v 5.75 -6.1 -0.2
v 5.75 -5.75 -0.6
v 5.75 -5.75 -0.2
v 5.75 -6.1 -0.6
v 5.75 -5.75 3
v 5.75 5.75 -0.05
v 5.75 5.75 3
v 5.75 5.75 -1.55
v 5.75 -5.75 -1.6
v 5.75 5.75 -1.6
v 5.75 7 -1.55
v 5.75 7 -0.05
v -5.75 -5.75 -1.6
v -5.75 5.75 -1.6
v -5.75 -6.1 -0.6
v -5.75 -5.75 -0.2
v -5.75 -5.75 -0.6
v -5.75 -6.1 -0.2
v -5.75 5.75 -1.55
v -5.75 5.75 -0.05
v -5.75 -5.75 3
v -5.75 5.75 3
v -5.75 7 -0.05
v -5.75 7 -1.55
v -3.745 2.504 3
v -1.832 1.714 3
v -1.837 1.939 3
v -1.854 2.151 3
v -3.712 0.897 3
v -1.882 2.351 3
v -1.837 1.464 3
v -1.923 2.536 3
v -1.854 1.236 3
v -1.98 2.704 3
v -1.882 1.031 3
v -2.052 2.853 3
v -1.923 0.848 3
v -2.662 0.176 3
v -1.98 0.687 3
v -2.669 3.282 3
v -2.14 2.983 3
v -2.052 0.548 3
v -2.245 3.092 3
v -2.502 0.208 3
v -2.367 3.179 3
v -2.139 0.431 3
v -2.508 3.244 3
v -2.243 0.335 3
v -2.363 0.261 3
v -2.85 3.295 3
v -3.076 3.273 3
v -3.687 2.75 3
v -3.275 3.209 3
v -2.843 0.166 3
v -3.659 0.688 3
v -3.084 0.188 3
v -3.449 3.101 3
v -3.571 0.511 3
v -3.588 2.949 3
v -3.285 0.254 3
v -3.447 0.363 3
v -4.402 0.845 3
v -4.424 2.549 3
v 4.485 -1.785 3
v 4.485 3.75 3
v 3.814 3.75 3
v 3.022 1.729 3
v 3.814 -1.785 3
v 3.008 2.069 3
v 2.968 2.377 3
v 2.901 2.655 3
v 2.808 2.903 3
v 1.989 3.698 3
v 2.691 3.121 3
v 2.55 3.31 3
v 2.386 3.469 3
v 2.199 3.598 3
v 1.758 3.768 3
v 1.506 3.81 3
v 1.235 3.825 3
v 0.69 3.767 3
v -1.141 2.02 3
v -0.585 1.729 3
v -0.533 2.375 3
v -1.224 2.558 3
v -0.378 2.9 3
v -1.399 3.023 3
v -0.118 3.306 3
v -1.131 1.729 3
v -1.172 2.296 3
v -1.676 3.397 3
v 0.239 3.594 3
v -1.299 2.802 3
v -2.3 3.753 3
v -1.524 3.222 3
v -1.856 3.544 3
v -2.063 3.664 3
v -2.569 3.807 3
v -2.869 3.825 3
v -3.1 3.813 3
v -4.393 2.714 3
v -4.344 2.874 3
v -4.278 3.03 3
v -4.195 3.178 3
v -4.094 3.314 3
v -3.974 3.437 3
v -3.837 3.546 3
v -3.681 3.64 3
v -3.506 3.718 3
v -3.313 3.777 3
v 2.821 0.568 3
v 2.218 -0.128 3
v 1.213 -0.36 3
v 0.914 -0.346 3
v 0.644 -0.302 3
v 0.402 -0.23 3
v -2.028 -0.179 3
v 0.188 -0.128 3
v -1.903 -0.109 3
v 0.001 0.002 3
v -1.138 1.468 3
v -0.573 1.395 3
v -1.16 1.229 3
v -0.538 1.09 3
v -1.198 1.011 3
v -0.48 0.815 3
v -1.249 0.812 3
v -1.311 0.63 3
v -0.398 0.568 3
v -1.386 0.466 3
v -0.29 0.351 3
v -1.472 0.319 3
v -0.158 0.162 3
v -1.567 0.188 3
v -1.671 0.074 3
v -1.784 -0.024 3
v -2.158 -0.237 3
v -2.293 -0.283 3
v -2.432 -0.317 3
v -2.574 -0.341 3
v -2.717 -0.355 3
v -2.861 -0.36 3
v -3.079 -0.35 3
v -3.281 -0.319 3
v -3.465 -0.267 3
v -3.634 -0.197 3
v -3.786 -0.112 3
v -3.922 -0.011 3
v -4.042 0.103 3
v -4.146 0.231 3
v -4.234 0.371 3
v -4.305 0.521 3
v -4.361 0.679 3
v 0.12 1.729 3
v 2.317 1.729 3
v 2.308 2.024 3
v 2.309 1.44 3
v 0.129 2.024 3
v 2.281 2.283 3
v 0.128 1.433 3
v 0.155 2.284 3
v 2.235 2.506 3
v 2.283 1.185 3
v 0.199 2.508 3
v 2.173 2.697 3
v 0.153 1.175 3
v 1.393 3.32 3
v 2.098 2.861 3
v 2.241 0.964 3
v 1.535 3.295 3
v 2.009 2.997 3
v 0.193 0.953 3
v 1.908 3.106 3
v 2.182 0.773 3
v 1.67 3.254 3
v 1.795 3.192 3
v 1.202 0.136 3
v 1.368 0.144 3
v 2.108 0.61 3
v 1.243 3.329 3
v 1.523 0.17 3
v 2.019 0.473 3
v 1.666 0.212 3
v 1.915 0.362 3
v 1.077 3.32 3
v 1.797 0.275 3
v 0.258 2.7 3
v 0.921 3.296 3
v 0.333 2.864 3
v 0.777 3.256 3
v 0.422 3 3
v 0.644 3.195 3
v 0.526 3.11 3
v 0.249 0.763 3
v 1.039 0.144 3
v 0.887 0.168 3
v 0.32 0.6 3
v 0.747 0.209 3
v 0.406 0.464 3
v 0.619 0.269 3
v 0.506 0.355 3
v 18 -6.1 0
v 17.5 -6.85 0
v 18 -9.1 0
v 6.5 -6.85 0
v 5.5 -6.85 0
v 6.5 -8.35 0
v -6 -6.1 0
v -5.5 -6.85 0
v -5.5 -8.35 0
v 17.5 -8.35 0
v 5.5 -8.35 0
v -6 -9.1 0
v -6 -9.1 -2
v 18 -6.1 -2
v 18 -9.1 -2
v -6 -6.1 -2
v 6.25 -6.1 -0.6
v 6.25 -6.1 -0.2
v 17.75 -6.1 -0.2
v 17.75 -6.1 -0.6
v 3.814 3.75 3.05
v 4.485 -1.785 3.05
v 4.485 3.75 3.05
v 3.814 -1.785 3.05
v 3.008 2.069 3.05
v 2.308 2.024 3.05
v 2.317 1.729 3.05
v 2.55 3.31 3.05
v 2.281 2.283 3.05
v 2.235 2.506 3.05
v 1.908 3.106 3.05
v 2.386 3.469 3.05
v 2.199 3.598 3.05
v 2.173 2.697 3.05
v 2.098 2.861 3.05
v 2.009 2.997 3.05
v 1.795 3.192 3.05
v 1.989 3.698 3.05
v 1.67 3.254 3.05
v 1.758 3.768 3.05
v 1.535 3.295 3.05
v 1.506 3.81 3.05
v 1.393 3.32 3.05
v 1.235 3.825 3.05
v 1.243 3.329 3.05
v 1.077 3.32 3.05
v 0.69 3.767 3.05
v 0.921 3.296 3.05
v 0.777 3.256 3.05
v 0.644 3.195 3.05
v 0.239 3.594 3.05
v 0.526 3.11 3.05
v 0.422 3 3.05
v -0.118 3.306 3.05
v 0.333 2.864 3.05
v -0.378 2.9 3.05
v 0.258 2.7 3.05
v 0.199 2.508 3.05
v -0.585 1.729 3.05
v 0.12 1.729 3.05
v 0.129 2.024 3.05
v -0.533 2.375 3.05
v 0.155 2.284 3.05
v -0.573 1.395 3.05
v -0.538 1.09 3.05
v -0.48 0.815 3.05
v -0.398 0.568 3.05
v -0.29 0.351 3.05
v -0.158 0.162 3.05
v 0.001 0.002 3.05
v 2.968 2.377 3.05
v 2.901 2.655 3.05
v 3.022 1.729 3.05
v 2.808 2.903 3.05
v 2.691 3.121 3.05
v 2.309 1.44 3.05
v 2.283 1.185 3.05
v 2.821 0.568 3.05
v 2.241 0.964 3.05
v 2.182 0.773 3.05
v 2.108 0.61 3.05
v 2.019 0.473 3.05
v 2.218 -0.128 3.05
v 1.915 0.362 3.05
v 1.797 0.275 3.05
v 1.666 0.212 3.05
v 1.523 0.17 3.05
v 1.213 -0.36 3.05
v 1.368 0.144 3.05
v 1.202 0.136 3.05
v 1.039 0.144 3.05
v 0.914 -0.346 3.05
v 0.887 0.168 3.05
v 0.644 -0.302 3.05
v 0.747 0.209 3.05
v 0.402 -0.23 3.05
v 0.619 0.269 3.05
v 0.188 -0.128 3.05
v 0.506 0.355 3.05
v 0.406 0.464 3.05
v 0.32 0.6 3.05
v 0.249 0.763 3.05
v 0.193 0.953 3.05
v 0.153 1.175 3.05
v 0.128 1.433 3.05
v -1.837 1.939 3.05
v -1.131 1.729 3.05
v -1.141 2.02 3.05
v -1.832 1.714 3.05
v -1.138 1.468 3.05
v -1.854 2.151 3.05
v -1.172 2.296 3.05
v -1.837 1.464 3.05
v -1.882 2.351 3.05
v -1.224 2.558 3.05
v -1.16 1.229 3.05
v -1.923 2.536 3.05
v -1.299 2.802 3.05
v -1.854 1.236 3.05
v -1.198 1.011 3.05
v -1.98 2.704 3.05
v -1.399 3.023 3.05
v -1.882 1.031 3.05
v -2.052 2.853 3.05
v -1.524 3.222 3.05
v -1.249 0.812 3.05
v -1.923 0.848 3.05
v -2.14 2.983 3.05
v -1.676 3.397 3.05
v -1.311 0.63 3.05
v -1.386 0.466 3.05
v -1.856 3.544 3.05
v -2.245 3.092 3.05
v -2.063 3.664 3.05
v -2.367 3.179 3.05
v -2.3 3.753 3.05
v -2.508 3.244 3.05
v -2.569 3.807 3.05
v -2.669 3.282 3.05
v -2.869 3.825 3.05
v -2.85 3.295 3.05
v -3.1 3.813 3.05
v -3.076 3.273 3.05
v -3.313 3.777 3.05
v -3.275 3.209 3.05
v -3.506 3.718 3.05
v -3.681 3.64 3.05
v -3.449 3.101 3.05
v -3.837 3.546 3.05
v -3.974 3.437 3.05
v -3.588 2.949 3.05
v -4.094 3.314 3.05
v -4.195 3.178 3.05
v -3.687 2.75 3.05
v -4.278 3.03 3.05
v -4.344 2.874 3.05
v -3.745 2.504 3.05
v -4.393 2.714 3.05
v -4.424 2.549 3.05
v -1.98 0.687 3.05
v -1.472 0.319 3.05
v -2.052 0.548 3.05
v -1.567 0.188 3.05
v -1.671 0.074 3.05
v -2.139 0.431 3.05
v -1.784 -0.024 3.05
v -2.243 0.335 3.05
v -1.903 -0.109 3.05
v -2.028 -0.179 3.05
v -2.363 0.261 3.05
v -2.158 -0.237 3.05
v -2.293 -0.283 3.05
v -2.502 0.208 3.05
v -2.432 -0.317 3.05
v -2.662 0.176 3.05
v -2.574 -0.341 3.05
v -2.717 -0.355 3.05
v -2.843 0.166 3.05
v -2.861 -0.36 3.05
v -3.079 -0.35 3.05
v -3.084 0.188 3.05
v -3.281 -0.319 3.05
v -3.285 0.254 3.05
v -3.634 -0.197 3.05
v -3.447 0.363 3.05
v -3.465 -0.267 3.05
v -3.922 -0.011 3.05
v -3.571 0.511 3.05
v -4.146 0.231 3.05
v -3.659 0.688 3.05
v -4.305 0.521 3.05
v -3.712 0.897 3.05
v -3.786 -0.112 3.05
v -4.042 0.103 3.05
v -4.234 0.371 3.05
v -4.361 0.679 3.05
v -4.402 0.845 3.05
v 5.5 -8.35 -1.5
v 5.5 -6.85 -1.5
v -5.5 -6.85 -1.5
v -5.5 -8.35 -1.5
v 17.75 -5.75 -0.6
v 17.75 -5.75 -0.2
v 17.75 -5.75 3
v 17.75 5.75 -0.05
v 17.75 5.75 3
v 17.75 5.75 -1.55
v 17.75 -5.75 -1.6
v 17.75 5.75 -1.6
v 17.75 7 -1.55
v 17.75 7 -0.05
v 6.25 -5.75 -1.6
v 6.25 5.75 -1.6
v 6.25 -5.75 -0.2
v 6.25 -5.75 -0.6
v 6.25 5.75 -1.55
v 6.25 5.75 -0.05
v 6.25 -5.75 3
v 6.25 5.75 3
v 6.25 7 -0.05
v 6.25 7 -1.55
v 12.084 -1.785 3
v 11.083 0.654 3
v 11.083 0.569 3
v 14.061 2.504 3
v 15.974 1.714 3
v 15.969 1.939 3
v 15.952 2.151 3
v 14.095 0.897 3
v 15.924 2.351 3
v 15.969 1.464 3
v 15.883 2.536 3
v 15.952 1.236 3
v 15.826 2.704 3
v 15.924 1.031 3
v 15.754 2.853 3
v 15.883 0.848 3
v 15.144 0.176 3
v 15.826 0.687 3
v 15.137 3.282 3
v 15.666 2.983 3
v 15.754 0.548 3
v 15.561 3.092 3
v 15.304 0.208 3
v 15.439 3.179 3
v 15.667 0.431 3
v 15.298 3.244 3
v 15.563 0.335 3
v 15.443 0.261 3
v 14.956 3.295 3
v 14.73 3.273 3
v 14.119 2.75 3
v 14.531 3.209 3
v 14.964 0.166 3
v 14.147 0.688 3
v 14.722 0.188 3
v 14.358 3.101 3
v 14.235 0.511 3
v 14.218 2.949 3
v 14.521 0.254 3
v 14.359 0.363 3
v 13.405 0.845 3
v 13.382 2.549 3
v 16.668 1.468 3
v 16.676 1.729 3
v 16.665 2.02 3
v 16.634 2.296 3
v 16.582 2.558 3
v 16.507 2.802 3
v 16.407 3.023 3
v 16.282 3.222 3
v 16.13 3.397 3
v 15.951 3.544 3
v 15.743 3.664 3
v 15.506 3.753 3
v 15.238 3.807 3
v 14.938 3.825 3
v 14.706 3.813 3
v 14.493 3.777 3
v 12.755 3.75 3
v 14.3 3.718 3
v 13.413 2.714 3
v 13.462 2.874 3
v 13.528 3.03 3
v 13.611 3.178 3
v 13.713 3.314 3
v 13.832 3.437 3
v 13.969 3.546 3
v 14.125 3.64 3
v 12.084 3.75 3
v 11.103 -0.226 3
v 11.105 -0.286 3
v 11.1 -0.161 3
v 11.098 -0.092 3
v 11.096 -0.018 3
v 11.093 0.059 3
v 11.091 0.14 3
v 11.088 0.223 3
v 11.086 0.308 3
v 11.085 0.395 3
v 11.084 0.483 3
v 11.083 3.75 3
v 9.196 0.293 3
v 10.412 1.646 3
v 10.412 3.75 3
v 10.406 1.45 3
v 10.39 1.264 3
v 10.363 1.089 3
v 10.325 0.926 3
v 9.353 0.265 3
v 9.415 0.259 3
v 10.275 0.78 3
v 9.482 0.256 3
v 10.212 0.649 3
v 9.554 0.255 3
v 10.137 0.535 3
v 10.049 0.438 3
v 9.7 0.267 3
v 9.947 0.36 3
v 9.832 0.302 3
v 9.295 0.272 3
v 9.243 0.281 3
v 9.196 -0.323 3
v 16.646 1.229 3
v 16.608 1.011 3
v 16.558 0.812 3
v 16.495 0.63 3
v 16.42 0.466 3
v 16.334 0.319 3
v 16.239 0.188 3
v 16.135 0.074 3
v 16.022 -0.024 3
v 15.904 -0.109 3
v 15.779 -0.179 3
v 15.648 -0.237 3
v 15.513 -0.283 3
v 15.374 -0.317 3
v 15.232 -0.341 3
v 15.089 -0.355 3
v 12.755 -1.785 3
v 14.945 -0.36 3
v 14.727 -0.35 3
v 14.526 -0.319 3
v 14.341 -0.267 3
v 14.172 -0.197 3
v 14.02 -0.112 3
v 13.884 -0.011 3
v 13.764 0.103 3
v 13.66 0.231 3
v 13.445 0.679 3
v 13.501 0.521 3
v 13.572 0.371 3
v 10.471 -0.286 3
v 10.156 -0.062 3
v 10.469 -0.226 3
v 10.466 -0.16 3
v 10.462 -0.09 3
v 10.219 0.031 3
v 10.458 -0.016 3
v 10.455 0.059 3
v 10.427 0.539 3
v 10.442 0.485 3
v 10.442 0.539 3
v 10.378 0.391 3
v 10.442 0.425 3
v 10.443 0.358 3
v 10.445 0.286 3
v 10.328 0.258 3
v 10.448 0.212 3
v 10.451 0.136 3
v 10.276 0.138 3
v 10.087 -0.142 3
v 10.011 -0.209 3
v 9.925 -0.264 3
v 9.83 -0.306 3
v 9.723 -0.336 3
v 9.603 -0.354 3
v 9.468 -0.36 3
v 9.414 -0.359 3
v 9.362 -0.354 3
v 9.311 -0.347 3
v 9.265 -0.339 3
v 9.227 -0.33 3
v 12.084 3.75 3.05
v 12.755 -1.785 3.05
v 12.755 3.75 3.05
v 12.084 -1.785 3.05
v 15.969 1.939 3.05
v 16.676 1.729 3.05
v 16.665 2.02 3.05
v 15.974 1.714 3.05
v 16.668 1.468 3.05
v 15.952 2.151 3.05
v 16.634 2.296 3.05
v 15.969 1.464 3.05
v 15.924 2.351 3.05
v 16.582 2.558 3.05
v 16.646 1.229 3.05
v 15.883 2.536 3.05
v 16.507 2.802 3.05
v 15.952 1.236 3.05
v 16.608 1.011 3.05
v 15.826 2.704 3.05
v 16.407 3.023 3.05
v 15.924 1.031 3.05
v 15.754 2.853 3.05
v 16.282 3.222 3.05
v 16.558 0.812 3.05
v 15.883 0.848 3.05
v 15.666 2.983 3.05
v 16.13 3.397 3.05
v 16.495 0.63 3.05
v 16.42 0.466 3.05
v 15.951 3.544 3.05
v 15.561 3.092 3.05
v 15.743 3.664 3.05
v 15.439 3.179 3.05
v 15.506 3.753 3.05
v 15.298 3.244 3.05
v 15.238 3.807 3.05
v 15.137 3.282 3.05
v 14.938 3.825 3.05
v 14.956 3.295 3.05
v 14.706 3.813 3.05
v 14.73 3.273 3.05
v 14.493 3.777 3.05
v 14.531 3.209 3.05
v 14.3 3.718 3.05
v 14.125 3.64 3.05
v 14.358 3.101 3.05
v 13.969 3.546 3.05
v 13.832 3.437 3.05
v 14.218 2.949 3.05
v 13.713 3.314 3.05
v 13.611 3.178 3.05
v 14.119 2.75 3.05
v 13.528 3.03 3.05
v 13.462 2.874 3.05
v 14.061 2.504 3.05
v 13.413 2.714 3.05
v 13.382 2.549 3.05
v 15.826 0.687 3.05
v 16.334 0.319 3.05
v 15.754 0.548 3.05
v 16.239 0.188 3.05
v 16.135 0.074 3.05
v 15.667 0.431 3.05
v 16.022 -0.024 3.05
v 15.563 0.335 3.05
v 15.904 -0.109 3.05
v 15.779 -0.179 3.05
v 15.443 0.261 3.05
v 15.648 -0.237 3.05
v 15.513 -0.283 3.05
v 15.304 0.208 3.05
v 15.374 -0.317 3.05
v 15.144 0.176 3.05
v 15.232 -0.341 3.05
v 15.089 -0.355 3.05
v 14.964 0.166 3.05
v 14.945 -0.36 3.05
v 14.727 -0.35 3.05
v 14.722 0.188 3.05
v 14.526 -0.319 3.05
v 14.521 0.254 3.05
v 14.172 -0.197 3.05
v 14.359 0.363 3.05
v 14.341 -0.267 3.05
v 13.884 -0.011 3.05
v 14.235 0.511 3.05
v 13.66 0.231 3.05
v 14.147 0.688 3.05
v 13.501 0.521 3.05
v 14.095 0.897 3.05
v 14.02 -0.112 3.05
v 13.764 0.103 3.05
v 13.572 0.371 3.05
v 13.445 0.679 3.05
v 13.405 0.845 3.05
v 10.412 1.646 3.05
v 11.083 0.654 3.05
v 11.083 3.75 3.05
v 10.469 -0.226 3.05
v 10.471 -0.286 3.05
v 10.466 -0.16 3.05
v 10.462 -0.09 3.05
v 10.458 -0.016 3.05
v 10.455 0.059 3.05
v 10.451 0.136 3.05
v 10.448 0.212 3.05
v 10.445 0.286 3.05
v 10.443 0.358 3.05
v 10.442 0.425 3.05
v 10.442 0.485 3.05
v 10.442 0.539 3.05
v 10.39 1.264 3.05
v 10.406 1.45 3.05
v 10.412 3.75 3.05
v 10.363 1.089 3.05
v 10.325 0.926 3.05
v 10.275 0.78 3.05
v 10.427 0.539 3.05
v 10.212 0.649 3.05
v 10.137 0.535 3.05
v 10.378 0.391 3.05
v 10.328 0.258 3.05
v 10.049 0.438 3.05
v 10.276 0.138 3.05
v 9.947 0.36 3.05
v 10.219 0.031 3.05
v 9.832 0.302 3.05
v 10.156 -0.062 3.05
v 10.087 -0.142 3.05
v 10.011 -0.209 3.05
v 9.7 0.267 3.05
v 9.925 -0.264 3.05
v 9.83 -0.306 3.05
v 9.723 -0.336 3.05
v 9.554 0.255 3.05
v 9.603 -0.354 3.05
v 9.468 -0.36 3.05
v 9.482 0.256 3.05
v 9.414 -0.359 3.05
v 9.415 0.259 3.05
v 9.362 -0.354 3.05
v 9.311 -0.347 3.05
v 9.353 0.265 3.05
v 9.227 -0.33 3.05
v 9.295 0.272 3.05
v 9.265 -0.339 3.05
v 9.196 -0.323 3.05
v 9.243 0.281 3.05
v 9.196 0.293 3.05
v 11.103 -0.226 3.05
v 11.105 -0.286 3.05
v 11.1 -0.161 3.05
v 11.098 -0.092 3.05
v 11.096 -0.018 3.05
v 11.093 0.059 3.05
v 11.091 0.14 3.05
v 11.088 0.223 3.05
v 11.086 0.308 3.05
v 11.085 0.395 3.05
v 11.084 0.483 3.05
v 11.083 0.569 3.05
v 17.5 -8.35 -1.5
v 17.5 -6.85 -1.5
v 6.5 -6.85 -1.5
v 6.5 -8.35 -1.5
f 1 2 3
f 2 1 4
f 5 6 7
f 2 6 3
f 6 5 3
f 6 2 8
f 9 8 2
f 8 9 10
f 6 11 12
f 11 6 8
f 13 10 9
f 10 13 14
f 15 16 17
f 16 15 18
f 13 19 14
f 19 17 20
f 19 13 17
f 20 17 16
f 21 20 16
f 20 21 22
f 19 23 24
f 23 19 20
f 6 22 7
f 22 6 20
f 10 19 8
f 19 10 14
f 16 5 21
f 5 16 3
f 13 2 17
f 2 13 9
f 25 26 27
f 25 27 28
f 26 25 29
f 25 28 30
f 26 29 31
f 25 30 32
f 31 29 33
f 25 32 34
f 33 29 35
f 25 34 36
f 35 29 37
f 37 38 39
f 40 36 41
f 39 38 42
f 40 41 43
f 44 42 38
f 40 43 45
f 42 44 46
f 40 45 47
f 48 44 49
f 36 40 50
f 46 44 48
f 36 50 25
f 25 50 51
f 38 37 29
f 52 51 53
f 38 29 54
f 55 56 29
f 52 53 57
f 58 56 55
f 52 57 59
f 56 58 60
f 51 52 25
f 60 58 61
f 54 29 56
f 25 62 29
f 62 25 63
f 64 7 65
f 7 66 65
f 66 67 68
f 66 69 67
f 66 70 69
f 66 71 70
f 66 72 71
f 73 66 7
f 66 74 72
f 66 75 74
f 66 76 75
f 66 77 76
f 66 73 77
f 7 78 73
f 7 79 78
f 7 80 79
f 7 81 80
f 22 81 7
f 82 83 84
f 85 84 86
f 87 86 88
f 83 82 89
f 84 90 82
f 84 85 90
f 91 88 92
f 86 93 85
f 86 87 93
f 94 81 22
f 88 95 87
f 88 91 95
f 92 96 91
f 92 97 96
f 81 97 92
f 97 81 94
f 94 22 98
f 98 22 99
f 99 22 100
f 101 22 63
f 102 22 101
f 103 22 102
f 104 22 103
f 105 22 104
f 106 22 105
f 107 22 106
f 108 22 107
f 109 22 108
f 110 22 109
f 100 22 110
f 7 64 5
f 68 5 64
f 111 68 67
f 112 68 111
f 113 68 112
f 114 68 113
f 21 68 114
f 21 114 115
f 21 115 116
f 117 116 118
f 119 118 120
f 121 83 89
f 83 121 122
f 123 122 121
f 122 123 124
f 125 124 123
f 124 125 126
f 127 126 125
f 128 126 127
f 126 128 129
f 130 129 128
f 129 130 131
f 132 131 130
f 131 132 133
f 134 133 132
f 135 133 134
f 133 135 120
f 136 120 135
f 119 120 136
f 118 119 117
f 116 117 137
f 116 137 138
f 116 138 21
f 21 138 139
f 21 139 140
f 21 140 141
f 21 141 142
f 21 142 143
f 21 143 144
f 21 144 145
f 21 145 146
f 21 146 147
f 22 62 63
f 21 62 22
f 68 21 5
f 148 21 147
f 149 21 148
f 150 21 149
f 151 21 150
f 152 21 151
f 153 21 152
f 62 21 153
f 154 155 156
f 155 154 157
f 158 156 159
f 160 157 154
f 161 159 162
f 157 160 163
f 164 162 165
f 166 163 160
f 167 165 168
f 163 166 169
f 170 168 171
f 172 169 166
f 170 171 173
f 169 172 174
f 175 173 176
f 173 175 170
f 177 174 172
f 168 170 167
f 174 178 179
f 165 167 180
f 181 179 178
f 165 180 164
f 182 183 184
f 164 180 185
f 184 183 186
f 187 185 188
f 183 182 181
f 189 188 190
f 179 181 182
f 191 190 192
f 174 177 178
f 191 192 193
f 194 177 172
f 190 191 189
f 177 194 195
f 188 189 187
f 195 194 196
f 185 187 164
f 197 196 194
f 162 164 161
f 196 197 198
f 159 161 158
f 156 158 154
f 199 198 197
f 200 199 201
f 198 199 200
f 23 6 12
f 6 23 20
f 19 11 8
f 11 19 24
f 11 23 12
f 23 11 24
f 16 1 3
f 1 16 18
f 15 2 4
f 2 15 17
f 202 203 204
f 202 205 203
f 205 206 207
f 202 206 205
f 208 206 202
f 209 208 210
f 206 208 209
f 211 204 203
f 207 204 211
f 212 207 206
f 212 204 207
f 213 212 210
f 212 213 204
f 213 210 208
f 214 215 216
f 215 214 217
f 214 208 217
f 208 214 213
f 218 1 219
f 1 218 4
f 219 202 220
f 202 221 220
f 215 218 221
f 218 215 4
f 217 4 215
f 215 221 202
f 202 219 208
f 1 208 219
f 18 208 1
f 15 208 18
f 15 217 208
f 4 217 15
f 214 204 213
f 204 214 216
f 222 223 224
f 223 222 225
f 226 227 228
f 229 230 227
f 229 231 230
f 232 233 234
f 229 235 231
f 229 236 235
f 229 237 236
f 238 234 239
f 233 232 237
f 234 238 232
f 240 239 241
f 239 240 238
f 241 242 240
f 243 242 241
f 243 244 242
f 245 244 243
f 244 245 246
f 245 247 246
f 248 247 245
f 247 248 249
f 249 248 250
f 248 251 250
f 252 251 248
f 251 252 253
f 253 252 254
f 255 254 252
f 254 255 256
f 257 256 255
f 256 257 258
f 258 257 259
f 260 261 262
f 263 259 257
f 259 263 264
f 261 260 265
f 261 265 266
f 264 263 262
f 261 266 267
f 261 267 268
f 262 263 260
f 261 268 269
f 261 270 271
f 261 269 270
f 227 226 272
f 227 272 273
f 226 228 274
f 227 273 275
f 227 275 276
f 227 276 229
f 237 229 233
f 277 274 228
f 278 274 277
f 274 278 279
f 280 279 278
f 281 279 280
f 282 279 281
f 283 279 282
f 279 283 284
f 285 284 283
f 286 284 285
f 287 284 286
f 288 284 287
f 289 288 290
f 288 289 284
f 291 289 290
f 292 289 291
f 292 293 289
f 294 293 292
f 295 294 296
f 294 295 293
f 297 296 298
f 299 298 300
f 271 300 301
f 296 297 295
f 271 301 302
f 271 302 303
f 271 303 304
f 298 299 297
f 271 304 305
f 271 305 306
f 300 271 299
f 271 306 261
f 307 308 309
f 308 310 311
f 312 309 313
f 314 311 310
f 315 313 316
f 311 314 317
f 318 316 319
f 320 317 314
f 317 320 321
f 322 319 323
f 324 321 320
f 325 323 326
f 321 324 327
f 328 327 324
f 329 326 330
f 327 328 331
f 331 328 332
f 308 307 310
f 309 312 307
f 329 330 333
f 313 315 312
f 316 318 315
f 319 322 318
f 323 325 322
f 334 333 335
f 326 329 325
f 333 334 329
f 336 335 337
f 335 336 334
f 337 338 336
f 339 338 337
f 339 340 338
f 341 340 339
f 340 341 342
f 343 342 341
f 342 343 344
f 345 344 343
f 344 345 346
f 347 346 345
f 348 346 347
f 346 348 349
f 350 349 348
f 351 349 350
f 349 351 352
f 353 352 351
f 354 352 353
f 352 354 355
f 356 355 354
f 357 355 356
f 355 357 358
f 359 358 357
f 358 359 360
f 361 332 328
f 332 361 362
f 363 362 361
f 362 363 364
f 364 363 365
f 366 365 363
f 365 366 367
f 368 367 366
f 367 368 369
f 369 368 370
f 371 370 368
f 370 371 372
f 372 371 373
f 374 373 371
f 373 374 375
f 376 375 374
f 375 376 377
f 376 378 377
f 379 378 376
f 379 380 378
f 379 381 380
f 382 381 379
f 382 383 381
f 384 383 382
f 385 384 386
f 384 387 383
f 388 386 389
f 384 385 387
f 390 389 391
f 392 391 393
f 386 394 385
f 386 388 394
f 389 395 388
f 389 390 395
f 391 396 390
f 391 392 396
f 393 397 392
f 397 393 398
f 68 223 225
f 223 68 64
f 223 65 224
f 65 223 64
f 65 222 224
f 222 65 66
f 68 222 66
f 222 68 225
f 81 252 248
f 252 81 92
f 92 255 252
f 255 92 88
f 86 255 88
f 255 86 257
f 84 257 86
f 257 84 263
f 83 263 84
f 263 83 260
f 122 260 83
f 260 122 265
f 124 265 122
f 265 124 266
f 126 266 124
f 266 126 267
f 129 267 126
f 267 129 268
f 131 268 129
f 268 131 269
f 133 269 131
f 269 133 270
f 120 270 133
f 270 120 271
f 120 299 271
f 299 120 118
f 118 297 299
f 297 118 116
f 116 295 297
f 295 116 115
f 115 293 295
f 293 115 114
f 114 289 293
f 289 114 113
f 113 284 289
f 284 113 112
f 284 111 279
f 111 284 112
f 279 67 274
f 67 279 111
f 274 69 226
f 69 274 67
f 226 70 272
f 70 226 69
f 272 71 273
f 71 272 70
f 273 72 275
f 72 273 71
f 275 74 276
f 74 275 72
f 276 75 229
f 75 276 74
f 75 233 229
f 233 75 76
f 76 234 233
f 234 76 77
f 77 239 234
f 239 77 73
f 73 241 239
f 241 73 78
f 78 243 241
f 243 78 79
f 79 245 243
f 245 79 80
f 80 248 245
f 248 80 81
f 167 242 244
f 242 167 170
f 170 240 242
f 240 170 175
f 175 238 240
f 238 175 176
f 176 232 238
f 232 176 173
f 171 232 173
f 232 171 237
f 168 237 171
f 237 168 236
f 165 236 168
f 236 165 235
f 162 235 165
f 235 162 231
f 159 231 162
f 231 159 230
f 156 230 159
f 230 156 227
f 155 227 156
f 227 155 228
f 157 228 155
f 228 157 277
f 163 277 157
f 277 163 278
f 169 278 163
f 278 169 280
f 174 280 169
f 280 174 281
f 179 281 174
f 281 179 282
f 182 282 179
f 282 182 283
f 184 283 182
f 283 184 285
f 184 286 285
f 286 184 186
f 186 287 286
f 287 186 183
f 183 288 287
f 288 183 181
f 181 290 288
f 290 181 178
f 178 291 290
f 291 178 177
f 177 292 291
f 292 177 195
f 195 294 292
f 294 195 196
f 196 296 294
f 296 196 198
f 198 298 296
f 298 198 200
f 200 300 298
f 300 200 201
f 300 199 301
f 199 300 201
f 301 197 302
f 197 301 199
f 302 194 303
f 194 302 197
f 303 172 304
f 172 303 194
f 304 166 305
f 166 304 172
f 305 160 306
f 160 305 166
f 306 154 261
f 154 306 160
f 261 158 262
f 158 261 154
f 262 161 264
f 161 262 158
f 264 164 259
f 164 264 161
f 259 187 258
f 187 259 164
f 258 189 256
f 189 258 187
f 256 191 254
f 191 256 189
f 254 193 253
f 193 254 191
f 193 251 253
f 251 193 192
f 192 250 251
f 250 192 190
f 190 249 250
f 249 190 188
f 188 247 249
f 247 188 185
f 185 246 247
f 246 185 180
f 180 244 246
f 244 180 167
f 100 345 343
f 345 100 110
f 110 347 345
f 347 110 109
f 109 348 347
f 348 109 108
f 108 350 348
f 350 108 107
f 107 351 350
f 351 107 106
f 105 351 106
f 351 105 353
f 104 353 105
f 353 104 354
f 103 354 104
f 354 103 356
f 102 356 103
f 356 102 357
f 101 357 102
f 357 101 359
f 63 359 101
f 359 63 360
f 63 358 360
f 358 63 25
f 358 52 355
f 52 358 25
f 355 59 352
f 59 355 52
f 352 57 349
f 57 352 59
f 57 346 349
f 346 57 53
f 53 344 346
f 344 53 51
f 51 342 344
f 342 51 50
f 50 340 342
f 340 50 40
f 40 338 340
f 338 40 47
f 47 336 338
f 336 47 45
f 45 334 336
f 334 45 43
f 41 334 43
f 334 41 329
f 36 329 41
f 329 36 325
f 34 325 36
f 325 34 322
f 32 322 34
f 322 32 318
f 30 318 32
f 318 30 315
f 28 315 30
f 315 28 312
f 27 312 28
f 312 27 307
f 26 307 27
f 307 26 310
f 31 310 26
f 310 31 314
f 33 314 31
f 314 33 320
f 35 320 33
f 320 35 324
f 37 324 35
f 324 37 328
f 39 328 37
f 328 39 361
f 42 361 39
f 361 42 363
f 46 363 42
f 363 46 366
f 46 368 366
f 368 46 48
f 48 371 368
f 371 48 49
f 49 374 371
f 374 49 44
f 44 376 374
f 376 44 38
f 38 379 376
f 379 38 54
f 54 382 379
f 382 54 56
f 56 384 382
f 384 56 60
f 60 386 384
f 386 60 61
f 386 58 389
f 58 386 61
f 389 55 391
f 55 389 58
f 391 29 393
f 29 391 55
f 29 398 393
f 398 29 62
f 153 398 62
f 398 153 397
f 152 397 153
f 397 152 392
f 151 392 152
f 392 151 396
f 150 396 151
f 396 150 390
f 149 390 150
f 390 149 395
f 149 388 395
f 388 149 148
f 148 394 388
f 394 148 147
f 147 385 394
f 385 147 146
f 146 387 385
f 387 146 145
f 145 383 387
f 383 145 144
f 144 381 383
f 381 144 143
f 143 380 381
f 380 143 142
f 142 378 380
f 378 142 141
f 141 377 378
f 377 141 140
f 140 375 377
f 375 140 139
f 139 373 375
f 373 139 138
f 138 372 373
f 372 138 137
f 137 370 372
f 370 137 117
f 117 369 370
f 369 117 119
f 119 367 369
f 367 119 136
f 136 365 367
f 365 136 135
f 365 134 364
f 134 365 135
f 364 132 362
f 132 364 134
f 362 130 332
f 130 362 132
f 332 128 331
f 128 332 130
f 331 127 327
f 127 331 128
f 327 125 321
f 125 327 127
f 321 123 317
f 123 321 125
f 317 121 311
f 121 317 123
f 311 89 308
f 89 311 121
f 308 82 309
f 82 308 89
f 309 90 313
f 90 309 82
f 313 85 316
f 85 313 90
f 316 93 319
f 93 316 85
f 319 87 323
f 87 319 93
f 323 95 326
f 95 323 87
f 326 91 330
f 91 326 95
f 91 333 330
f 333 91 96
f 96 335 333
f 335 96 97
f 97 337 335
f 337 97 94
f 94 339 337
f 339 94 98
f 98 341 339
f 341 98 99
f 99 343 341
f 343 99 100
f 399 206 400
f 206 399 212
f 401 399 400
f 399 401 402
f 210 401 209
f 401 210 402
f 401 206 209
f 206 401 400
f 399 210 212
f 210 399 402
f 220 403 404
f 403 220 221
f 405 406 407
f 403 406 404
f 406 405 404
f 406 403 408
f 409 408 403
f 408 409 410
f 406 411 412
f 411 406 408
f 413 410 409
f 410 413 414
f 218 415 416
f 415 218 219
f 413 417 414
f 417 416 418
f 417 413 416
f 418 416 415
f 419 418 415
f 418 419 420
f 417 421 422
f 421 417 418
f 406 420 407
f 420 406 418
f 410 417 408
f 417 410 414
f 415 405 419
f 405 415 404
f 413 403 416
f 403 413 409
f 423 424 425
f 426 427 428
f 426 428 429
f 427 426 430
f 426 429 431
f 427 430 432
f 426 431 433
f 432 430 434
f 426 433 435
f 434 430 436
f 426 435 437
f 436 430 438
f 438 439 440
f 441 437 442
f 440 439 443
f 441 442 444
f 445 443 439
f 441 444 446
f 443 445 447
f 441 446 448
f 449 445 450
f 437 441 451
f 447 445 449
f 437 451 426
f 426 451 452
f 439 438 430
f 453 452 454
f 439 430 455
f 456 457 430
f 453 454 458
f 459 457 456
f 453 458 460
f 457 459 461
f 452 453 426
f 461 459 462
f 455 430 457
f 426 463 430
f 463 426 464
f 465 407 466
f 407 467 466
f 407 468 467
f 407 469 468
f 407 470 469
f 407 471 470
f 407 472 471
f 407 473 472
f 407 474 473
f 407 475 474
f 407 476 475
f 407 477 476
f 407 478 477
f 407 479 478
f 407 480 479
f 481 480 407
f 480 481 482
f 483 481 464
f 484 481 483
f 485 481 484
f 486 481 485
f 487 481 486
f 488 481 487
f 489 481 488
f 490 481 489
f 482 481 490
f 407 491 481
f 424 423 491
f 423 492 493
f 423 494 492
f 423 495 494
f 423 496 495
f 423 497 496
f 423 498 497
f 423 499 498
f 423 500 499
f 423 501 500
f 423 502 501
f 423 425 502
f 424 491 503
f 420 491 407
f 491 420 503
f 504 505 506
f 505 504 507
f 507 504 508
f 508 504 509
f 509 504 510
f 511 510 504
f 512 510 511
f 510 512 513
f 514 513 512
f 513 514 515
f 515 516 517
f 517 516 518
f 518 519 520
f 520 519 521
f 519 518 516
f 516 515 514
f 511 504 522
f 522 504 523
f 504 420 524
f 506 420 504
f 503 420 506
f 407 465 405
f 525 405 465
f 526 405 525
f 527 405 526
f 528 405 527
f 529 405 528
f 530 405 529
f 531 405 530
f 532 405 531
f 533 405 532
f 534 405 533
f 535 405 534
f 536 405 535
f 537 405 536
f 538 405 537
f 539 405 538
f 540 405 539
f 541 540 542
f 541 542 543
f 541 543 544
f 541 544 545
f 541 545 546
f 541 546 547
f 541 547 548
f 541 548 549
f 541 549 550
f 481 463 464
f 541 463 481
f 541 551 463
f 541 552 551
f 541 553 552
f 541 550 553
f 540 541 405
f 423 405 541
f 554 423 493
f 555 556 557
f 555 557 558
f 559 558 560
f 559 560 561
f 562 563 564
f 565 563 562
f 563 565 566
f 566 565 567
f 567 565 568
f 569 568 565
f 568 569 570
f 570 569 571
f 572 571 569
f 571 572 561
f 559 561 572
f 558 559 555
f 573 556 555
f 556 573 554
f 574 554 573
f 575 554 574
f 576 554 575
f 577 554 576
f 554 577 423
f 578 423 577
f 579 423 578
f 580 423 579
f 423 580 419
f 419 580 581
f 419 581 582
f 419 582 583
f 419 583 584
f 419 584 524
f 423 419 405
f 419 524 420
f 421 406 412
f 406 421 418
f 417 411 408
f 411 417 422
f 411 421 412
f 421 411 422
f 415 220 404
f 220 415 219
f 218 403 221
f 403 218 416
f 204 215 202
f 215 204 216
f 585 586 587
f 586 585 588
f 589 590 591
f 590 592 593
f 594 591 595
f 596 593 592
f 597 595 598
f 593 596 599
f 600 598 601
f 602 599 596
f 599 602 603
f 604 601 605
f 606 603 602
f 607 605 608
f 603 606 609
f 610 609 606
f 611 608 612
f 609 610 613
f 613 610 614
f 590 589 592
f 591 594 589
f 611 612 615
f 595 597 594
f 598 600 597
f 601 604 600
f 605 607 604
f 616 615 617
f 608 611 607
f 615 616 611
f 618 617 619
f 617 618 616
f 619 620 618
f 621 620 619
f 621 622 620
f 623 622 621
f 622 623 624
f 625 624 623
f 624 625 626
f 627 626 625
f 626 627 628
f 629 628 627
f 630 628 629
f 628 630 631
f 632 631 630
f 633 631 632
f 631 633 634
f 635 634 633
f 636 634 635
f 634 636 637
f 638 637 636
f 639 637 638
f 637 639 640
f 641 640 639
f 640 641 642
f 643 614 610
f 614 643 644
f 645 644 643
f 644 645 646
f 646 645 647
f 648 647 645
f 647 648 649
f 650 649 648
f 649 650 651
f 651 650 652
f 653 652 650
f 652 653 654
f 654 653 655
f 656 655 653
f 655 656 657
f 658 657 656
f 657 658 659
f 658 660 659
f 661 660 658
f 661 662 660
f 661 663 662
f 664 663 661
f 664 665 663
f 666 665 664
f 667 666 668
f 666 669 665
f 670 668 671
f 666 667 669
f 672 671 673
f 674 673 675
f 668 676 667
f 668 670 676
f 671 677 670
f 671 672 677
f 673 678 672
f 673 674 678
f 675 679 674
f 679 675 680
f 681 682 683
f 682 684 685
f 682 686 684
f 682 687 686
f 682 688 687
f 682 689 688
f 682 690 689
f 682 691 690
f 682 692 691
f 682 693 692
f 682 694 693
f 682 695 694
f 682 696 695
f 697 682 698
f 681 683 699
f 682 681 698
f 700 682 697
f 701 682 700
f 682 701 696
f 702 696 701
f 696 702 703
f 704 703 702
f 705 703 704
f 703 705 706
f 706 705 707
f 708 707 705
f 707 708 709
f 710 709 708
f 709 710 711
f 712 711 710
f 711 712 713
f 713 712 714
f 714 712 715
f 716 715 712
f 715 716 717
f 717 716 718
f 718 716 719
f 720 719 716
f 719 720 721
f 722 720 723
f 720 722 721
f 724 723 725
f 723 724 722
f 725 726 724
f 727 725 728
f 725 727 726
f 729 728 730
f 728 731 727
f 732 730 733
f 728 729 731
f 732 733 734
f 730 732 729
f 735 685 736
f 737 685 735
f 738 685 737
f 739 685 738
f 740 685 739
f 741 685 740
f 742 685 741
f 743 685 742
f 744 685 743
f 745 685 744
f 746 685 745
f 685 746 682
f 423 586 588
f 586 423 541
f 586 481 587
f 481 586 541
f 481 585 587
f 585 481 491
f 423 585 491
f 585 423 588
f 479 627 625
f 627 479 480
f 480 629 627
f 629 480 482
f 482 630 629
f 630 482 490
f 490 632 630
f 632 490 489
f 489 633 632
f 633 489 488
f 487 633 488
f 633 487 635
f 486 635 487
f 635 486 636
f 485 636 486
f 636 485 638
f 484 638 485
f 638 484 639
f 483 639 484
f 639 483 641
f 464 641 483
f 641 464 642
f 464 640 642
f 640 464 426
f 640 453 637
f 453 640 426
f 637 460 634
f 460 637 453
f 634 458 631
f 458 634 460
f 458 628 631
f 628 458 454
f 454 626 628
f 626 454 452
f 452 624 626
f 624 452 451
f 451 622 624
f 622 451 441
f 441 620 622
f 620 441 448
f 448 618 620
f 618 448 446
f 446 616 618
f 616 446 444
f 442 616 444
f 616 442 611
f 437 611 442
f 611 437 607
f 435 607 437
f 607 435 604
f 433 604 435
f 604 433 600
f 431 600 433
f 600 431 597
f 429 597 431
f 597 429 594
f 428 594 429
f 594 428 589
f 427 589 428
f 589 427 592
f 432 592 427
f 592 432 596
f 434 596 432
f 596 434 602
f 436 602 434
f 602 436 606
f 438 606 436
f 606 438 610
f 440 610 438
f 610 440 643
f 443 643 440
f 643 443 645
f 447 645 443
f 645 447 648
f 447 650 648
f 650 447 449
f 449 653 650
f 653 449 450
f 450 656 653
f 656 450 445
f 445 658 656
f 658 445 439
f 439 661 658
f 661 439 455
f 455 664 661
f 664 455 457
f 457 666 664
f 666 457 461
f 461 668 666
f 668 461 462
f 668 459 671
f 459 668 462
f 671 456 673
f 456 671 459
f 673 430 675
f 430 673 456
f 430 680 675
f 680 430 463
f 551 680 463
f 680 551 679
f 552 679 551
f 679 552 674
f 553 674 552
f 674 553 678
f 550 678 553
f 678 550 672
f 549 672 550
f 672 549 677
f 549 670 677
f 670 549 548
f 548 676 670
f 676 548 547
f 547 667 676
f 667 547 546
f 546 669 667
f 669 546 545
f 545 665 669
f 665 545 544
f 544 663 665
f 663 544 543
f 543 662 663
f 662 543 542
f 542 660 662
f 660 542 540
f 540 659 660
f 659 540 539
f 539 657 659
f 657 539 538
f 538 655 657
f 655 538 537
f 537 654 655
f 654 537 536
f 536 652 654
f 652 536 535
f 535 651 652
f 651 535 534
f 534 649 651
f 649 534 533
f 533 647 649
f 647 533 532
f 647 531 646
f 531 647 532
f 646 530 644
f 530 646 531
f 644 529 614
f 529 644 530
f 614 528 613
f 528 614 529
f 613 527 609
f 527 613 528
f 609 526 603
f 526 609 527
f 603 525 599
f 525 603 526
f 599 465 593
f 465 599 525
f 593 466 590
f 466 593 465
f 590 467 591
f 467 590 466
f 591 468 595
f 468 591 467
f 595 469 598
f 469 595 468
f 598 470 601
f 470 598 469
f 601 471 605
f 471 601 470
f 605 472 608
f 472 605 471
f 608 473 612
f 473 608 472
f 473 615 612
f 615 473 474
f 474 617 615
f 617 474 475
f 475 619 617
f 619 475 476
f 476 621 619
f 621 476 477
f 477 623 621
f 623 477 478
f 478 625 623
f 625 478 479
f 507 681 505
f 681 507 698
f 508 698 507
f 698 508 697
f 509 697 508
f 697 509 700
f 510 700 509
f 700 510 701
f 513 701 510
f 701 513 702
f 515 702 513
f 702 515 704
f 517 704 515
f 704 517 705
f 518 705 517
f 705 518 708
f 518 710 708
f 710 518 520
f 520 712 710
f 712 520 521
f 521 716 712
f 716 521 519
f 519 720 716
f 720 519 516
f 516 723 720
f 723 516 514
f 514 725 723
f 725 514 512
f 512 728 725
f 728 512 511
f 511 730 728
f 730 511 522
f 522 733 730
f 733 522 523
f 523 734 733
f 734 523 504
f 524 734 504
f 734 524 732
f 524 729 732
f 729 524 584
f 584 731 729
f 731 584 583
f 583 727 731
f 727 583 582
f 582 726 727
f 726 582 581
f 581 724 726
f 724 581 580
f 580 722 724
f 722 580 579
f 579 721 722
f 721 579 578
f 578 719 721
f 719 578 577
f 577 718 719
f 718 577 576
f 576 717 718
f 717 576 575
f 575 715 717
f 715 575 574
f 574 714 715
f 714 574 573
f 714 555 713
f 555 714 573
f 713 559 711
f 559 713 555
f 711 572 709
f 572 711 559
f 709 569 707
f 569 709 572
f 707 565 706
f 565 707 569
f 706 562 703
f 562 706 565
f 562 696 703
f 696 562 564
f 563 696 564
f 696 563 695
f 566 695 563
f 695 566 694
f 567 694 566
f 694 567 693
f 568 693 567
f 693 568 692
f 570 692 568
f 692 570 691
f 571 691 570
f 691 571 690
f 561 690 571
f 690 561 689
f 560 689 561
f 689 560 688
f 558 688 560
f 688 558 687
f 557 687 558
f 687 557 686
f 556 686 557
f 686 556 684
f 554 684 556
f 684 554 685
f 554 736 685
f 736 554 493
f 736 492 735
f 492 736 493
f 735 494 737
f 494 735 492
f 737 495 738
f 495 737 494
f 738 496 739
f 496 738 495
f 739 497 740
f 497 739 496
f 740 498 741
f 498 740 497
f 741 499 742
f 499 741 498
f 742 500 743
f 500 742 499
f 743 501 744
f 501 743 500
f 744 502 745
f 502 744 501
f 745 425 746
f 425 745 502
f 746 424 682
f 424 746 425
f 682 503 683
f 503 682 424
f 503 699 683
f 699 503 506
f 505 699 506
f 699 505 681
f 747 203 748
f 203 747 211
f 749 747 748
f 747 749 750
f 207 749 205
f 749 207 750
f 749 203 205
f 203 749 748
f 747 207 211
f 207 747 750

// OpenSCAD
numb=2;
cap=["loc","clr"];

   for (i=[0:numb-1])
   {

difference() {

   union () {
    translate ([i*12,0,-1.5+1.4]) cube ( [11.5,11.5,3], center = true ); //buttons below panel

    translate ([i*12,0,-1.5+3]) cube ( [11.5,11.5,3], center = true ); //buttons above panel

    translate ([i*12,6,-0.8]) cube ( [11.5,2,1.5], center = true ); //stop below

    translate ([i*12,-6.5,-0.4]) cube ( [11.5,3,0.4], center = true ); //hinge

    translate ([i*12,-7.6,-1]) cube ( [12,3,2], center = true ); //mount bar

    translate([i*12+5, 3.75, 2.65]) linear_extrude(0.4) rotate([0,0,180]) text(cap[i],size=5.5);



   //translate ([0,-8.5,0.7]) cube ( [49,4,1.4], center = true ); //buttons

   //translate ([0,-6.5,-0.4]) cube ( [49,4,3], center = true ); //buttons


   };



   translate ([i*12,-7.6,-0.75]) cube ( [11,1.5,1.5], center = true ); //locating recess

   };

   
};
